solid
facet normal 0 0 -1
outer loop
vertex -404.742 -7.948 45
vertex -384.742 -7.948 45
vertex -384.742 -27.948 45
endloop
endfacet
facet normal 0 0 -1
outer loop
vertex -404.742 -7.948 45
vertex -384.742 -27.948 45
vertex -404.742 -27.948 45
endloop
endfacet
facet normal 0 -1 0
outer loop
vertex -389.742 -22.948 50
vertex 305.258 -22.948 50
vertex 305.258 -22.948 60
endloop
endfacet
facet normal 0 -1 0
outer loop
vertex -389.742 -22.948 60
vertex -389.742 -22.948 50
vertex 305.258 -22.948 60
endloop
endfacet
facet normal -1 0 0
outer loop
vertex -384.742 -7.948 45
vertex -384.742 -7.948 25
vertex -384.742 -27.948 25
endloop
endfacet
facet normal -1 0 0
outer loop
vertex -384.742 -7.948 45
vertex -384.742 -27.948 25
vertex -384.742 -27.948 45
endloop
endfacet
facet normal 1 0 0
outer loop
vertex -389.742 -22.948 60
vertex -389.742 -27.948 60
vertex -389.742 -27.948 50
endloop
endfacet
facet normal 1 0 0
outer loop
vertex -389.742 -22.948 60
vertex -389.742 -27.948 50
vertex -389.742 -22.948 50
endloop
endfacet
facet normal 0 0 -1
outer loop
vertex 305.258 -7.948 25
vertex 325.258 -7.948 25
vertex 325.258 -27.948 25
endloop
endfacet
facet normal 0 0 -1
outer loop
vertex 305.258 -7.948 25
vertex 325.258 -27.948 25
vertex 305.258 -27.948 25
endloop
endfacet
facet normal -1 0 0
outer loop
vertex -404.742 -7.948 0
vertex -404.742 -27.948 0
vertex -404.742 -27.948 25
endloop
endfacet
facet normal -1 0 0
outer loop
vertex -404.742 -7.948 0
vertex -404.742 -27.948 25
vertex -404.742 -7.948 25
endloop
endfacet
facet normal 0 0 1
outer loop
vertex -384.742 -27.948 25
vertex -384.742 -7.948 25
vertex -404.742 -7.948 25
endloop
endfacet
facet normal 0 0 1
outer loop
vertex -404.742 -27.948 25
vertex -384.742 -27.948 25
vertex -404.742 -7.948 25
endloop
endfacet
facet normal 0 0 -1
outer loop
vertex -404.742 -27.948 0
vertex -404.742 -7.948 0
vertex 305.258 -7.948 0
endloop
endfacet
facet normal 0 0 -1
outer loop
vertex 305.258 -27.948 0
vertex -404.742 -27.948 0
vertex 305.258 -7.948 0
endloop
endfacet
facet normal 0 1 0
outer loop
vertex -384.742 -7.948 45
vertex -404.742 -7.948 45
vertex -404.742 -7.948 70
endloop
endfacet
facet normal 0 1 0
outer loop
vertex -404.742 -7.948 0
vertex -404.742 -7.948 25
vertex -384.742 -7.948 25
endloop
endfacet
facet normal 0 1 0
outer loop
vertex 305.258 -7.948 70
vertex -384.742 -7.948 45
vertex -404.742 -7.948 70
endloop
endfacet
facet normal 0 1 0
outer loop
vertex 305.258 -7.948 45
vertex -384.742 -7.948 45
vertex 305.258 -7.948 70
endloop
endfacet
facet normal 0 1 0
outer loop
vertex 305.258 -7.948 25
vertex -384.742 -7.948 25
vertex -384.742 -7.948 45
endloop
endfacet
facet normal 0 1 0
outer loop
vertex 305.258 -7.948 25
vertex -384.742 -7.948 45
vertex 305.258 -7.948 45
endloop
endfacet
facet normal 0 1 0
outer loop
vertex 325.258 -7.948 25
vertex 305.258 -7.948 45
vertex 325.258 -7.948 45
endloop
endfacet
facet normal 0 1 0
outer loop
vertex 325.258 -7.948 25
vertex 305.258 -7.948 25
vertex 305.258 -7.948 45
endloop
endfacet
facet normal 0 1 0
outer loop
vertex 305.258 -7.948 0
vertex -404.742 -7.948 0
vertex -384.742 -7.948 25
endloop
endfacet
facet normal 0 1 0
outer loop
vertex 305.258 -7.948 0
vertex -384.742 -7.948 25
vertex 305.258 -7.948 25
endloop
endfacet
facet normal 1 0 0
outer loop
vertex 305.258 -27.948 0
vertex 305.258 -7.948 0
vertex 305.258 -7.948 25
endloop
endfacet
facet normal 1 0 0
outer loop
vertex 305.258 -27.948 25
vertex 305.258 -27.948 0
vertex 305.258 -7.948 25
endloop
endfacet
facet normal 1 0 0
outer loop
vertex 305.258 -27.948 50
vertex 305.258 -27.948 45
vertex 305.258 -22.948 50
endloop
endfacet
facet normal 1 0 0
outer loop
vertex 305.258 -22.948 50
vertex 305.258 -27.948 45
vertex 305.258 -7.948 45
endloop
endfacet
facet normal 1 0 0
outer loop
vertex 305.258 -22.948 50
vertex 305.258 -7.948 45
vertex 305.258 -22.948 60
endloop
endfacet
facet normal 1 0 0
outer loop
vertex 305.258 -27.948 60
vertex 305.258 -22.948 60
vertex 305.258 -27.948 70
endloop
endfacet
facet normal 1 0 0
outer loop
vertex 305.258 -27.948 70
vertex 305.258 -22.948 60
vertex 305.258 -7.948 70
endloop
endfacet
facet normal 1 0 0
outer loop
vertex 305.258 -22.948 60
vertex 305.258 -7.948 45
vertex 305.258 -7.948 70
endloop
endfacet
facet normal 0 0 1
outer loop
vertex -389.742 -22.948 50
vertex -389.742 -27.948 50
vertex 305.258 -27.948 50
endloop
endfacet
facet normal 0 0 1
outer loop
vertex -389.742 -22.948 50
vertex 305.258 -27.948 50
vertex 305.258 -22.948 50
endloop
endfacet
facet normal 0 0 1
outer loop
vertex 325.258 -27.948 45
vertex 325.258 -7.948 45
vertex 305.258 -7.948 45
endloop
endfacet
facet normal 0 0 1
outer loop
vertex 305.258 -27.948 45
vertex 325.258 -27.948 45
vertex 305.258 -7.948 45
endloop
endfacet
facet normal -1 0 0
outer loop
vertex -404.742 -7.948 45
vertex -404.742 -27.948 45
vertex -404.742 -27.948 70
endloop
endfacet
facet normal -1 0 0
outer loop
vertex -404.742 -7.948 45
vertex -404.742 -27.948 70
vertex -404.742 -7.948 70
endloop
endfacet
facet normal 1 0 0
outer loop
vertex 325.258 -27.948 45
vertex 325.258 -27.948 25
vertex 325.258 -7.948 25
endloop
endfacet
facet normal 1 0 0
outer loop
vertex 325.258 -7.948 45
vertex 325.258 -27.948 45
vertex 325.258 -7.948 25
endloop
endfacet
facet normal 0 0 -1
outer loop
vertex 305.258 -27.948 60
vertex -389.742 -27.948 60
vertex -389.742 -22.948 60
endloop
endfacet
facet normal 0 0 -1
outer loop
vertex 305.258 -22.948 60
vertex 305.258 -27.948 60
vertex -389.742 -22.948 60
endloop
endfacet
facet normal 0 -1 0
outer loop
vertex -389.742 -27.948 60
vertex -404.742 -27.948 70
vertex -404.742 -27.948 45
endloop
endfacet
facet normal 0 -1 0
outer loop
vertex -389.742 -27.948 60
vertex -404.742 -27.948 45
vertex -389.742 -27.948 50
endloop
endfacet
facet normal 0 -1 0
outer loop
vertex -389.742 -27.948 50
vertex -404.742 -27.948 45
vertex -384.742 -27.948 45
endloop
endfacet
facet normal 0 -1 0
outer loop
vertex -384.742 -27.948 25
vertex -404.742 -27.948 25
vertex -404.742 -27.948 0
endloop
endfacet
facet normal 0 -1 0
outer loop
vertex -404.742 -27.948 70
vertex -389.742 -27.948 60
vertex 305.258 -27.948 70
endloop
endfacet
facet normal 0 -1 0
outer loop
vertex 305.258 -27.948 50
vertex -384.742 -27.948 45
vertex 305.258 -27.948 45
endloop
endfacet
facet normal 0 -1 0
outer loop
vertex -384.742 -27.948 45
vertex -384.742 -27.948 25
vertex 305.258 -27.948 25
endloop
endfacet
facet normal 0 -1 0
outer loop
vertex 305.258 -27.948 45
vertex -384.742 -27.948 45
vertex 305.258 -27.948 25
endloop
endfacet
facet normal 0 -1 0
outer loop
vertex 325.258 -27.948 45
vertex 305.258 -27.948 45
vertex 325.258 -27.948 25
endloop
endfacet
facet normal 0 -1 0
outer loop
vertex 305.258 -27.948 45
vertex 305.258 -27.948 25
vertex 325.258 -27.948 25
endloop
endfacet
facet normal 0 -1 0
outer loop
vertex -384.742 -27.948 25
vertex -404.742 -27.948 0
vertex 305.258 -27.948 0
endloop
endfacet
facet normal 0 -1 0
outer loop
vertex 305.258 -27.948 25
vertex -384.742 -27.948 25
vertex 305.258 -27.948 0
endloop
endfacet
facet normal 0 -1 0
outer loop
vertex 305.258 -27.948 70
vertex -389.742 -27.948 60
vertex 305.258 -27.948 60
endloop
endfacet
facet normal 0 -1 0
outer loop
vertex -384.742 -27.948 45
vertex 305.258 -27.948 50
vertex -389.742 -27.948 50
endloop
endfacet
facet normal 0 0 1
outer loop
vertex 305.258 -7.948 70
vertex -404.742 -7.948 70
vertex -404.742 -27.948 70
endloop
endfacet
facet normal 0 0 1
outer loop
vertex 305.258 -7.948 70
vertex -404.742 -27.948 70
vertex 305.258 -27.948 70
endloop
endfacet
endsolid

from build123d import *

# Parameters (mm, degrees)
F0_W          = 730
F0_H          = 20
F1_DEPTH      = 70
F2_W          = 5
F2_H          = 10
F3_DEPTH      = 715
F3_DEPTH_BACK = 15
F4_W          = 20
F4_H          = 25
F4_H_2        = 20
F5_DEPTH      = 20.001


with BuildPart() as f1:
    # F0 (on Top) → F1 (new body)
    with BuildSketch(Plane.XY):
        with Locations((-39.742246, -17.948127)):
            Rectangle(F0_W, F0_H)
    extrude(amount=F1_DEPTH)

    # F2 (on face) → F3 (cut, two sides)
    with BuildSketch(Plane.YZ.offset(325.257754)) as f3_sk:
        with Locations((-25.448127, 55)):
            Rectangle(F2_W, F2_H)
    extrude(amount=-F3_DEPTH, mode=Mode.SUBTRACT)
    extrude(f3_sk.sketch, amount=-F3_DEPTH_BACK, mode=Mode.SUBTRACT)

    # F4 (on face) → F5 (cut, through all)
    with BuildSketch(Plane(origin=(0, -7.948127, 0), x_dir=(-1, 0, 0), z_dir=(0, 1, 0))):
        with Locations((-315.257754, 57.5)):
            Rectangle(F4_W, F4_H)
        with Locations((-315.257754, 12.5)):
            Rectangle(F4_W, F4_H)
        with Locations((394.742246, 35)):
            Rectangle(F4_W, F4_H_2)
    extrude(amount=-F5_DEPTH, mode=Mode.SUBTRACT)


solid = f1.part
